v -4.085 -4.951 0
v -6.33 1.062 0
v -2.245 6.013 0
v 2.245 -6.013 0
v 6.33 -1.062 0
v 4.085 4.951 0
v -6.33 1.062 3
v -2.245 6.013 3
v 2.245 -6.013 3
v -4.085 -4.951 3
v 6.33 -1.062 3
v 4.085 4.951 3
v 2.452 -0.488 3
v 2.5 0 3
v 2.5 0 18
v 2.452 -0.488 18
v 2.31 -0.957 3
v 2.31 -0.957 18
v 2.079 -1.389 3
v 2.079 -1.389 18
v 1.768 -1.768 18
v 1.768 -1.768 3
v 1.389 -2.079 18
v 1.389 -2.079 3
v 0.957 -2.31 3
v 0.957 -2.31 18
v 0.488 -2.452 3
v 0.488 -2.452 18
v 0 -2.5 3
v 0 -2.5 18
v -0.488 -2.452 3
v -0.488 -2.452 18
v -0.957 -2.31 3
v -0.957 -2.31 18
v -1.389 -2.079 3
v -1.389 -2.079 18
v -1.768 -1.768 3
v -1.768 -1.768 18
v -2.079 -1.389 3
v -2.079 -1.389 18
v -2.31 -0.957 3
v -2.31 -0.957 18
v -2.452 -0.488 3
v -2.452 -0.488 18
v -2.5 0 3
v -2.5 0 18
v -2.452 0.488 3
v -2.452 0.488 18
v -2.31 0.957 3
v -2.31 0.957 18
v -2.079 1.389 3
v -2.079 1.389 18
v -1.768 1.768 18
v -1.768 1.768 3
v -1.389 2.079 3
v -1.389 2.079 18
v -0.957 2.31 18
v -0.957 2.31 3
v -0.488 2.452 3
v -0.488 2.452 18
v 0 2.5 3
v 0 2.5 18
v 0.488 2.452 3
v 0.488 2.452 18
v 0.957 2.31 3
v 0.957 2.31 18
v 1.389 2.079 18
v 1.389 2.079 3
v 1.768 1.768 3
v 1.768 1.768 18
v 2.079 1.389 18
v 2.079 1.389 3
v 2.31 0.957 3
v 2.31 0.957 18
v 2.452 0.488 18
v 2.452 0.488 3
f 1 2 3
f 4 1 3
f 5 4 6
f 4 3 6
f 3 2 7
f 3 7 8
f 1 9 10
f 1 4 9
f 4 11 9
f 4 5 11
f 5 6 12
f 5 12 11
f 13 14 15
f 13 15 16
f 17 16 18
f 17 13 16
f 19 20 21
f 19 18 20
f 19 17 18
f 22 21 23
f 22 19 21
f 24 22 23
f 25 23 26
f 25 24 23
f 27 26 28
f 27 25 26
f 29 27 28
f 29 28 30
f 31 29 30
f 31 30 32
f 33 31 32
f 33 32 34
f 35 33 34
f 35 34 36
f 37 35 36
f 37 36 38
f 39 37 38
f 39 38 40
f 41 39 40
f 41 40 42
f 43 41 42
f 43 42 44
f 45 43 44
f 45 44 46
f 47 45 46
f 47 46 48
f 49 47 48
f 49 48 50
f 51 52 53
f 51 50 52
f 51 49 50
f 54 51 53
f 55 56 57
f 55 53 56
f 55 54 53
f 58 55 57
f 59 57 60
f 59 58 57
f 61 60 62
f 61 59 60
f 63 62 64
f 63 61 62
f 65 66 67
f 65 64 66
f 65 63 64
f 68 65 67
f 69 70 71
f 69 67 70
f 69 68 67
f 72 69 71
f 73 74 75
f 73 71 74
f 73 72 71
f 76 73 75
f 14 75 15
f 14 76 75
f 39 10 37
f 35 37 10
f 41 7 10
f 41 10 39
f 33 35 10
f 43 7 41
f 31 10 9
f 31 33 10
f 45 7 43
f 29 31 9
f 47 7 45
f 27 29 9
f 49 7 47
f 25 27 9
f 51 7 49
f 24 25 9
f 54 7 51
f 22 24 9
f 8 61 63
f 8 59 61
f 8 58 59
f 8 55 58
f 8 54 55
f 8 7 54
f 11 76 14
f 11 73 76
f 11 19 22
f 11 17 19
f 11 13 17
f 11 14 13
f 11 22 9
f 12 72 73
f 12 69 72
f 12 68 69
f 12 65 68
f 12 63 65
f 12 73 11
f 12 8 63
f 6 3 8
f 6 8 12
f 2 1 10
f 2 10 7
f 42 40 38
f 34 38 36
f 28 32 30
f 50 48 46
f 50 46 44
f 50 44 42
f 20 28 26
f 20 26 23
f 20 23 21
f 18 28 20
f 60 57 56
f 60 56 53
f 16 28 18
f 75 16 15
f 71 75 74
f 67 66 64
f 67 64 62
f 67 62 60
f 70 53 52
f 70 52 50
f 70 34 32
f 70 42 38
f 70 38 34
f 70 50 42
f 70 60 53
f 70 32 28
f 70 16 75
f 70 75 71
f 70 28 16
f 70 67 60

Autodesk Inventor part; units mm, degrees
ref_plane "YZ Plane" through (0, 0, 0) normal (1, 0, 0) x (0, 1, 0)
ref_plane "XZ Plane" through (0, 0, 0) normal (0, 1, 0) x (-1, 0, 0)
ref_plane "XY Plane" through (0, 0, 0) normal (0, 0, 1) x (1, 0, 0)
sketch "Sketch1" plane through (0, 0, 0) normal (0, 0, 1) x (1, 0, 0)
  line L0 (-6.33, 1.0622) -> (-2.2451, 6.013)
  line L1 (-2.2451, 6.013) -> (4.0849, 4.9508)
  line L2 (4.0849, 4.9508) -> (6.33, -1.0622)
  line L3 (6.33, -1.0622) -> (2.2451, -6.013)
  line L4 (2.2451, -6.013) -> (-4.0849, -4.9508)
  line L5 (-4.0849, -4.9508) -> (-6.33, 1.0622)
  point P0 (0, 0)
  point P1 (0, 0)
extrude "Extrusion1" add sketch "Sketch1" along normal blind 3
sketch "Sketch2" plane through (0, 0, 3) normal (0, 0, 1) x (1, 0, 0)
  circle A0 centre (0, 0) radius 2.5
  dimension "d2" = 5
extrude "Extrusion2" add sketch "Sketch2" along normal blind 15
thread "Thread1" size "M5x0.8" class "6g" standard "ANSI Metric M Profile" full length
properties part number "finalnut"
